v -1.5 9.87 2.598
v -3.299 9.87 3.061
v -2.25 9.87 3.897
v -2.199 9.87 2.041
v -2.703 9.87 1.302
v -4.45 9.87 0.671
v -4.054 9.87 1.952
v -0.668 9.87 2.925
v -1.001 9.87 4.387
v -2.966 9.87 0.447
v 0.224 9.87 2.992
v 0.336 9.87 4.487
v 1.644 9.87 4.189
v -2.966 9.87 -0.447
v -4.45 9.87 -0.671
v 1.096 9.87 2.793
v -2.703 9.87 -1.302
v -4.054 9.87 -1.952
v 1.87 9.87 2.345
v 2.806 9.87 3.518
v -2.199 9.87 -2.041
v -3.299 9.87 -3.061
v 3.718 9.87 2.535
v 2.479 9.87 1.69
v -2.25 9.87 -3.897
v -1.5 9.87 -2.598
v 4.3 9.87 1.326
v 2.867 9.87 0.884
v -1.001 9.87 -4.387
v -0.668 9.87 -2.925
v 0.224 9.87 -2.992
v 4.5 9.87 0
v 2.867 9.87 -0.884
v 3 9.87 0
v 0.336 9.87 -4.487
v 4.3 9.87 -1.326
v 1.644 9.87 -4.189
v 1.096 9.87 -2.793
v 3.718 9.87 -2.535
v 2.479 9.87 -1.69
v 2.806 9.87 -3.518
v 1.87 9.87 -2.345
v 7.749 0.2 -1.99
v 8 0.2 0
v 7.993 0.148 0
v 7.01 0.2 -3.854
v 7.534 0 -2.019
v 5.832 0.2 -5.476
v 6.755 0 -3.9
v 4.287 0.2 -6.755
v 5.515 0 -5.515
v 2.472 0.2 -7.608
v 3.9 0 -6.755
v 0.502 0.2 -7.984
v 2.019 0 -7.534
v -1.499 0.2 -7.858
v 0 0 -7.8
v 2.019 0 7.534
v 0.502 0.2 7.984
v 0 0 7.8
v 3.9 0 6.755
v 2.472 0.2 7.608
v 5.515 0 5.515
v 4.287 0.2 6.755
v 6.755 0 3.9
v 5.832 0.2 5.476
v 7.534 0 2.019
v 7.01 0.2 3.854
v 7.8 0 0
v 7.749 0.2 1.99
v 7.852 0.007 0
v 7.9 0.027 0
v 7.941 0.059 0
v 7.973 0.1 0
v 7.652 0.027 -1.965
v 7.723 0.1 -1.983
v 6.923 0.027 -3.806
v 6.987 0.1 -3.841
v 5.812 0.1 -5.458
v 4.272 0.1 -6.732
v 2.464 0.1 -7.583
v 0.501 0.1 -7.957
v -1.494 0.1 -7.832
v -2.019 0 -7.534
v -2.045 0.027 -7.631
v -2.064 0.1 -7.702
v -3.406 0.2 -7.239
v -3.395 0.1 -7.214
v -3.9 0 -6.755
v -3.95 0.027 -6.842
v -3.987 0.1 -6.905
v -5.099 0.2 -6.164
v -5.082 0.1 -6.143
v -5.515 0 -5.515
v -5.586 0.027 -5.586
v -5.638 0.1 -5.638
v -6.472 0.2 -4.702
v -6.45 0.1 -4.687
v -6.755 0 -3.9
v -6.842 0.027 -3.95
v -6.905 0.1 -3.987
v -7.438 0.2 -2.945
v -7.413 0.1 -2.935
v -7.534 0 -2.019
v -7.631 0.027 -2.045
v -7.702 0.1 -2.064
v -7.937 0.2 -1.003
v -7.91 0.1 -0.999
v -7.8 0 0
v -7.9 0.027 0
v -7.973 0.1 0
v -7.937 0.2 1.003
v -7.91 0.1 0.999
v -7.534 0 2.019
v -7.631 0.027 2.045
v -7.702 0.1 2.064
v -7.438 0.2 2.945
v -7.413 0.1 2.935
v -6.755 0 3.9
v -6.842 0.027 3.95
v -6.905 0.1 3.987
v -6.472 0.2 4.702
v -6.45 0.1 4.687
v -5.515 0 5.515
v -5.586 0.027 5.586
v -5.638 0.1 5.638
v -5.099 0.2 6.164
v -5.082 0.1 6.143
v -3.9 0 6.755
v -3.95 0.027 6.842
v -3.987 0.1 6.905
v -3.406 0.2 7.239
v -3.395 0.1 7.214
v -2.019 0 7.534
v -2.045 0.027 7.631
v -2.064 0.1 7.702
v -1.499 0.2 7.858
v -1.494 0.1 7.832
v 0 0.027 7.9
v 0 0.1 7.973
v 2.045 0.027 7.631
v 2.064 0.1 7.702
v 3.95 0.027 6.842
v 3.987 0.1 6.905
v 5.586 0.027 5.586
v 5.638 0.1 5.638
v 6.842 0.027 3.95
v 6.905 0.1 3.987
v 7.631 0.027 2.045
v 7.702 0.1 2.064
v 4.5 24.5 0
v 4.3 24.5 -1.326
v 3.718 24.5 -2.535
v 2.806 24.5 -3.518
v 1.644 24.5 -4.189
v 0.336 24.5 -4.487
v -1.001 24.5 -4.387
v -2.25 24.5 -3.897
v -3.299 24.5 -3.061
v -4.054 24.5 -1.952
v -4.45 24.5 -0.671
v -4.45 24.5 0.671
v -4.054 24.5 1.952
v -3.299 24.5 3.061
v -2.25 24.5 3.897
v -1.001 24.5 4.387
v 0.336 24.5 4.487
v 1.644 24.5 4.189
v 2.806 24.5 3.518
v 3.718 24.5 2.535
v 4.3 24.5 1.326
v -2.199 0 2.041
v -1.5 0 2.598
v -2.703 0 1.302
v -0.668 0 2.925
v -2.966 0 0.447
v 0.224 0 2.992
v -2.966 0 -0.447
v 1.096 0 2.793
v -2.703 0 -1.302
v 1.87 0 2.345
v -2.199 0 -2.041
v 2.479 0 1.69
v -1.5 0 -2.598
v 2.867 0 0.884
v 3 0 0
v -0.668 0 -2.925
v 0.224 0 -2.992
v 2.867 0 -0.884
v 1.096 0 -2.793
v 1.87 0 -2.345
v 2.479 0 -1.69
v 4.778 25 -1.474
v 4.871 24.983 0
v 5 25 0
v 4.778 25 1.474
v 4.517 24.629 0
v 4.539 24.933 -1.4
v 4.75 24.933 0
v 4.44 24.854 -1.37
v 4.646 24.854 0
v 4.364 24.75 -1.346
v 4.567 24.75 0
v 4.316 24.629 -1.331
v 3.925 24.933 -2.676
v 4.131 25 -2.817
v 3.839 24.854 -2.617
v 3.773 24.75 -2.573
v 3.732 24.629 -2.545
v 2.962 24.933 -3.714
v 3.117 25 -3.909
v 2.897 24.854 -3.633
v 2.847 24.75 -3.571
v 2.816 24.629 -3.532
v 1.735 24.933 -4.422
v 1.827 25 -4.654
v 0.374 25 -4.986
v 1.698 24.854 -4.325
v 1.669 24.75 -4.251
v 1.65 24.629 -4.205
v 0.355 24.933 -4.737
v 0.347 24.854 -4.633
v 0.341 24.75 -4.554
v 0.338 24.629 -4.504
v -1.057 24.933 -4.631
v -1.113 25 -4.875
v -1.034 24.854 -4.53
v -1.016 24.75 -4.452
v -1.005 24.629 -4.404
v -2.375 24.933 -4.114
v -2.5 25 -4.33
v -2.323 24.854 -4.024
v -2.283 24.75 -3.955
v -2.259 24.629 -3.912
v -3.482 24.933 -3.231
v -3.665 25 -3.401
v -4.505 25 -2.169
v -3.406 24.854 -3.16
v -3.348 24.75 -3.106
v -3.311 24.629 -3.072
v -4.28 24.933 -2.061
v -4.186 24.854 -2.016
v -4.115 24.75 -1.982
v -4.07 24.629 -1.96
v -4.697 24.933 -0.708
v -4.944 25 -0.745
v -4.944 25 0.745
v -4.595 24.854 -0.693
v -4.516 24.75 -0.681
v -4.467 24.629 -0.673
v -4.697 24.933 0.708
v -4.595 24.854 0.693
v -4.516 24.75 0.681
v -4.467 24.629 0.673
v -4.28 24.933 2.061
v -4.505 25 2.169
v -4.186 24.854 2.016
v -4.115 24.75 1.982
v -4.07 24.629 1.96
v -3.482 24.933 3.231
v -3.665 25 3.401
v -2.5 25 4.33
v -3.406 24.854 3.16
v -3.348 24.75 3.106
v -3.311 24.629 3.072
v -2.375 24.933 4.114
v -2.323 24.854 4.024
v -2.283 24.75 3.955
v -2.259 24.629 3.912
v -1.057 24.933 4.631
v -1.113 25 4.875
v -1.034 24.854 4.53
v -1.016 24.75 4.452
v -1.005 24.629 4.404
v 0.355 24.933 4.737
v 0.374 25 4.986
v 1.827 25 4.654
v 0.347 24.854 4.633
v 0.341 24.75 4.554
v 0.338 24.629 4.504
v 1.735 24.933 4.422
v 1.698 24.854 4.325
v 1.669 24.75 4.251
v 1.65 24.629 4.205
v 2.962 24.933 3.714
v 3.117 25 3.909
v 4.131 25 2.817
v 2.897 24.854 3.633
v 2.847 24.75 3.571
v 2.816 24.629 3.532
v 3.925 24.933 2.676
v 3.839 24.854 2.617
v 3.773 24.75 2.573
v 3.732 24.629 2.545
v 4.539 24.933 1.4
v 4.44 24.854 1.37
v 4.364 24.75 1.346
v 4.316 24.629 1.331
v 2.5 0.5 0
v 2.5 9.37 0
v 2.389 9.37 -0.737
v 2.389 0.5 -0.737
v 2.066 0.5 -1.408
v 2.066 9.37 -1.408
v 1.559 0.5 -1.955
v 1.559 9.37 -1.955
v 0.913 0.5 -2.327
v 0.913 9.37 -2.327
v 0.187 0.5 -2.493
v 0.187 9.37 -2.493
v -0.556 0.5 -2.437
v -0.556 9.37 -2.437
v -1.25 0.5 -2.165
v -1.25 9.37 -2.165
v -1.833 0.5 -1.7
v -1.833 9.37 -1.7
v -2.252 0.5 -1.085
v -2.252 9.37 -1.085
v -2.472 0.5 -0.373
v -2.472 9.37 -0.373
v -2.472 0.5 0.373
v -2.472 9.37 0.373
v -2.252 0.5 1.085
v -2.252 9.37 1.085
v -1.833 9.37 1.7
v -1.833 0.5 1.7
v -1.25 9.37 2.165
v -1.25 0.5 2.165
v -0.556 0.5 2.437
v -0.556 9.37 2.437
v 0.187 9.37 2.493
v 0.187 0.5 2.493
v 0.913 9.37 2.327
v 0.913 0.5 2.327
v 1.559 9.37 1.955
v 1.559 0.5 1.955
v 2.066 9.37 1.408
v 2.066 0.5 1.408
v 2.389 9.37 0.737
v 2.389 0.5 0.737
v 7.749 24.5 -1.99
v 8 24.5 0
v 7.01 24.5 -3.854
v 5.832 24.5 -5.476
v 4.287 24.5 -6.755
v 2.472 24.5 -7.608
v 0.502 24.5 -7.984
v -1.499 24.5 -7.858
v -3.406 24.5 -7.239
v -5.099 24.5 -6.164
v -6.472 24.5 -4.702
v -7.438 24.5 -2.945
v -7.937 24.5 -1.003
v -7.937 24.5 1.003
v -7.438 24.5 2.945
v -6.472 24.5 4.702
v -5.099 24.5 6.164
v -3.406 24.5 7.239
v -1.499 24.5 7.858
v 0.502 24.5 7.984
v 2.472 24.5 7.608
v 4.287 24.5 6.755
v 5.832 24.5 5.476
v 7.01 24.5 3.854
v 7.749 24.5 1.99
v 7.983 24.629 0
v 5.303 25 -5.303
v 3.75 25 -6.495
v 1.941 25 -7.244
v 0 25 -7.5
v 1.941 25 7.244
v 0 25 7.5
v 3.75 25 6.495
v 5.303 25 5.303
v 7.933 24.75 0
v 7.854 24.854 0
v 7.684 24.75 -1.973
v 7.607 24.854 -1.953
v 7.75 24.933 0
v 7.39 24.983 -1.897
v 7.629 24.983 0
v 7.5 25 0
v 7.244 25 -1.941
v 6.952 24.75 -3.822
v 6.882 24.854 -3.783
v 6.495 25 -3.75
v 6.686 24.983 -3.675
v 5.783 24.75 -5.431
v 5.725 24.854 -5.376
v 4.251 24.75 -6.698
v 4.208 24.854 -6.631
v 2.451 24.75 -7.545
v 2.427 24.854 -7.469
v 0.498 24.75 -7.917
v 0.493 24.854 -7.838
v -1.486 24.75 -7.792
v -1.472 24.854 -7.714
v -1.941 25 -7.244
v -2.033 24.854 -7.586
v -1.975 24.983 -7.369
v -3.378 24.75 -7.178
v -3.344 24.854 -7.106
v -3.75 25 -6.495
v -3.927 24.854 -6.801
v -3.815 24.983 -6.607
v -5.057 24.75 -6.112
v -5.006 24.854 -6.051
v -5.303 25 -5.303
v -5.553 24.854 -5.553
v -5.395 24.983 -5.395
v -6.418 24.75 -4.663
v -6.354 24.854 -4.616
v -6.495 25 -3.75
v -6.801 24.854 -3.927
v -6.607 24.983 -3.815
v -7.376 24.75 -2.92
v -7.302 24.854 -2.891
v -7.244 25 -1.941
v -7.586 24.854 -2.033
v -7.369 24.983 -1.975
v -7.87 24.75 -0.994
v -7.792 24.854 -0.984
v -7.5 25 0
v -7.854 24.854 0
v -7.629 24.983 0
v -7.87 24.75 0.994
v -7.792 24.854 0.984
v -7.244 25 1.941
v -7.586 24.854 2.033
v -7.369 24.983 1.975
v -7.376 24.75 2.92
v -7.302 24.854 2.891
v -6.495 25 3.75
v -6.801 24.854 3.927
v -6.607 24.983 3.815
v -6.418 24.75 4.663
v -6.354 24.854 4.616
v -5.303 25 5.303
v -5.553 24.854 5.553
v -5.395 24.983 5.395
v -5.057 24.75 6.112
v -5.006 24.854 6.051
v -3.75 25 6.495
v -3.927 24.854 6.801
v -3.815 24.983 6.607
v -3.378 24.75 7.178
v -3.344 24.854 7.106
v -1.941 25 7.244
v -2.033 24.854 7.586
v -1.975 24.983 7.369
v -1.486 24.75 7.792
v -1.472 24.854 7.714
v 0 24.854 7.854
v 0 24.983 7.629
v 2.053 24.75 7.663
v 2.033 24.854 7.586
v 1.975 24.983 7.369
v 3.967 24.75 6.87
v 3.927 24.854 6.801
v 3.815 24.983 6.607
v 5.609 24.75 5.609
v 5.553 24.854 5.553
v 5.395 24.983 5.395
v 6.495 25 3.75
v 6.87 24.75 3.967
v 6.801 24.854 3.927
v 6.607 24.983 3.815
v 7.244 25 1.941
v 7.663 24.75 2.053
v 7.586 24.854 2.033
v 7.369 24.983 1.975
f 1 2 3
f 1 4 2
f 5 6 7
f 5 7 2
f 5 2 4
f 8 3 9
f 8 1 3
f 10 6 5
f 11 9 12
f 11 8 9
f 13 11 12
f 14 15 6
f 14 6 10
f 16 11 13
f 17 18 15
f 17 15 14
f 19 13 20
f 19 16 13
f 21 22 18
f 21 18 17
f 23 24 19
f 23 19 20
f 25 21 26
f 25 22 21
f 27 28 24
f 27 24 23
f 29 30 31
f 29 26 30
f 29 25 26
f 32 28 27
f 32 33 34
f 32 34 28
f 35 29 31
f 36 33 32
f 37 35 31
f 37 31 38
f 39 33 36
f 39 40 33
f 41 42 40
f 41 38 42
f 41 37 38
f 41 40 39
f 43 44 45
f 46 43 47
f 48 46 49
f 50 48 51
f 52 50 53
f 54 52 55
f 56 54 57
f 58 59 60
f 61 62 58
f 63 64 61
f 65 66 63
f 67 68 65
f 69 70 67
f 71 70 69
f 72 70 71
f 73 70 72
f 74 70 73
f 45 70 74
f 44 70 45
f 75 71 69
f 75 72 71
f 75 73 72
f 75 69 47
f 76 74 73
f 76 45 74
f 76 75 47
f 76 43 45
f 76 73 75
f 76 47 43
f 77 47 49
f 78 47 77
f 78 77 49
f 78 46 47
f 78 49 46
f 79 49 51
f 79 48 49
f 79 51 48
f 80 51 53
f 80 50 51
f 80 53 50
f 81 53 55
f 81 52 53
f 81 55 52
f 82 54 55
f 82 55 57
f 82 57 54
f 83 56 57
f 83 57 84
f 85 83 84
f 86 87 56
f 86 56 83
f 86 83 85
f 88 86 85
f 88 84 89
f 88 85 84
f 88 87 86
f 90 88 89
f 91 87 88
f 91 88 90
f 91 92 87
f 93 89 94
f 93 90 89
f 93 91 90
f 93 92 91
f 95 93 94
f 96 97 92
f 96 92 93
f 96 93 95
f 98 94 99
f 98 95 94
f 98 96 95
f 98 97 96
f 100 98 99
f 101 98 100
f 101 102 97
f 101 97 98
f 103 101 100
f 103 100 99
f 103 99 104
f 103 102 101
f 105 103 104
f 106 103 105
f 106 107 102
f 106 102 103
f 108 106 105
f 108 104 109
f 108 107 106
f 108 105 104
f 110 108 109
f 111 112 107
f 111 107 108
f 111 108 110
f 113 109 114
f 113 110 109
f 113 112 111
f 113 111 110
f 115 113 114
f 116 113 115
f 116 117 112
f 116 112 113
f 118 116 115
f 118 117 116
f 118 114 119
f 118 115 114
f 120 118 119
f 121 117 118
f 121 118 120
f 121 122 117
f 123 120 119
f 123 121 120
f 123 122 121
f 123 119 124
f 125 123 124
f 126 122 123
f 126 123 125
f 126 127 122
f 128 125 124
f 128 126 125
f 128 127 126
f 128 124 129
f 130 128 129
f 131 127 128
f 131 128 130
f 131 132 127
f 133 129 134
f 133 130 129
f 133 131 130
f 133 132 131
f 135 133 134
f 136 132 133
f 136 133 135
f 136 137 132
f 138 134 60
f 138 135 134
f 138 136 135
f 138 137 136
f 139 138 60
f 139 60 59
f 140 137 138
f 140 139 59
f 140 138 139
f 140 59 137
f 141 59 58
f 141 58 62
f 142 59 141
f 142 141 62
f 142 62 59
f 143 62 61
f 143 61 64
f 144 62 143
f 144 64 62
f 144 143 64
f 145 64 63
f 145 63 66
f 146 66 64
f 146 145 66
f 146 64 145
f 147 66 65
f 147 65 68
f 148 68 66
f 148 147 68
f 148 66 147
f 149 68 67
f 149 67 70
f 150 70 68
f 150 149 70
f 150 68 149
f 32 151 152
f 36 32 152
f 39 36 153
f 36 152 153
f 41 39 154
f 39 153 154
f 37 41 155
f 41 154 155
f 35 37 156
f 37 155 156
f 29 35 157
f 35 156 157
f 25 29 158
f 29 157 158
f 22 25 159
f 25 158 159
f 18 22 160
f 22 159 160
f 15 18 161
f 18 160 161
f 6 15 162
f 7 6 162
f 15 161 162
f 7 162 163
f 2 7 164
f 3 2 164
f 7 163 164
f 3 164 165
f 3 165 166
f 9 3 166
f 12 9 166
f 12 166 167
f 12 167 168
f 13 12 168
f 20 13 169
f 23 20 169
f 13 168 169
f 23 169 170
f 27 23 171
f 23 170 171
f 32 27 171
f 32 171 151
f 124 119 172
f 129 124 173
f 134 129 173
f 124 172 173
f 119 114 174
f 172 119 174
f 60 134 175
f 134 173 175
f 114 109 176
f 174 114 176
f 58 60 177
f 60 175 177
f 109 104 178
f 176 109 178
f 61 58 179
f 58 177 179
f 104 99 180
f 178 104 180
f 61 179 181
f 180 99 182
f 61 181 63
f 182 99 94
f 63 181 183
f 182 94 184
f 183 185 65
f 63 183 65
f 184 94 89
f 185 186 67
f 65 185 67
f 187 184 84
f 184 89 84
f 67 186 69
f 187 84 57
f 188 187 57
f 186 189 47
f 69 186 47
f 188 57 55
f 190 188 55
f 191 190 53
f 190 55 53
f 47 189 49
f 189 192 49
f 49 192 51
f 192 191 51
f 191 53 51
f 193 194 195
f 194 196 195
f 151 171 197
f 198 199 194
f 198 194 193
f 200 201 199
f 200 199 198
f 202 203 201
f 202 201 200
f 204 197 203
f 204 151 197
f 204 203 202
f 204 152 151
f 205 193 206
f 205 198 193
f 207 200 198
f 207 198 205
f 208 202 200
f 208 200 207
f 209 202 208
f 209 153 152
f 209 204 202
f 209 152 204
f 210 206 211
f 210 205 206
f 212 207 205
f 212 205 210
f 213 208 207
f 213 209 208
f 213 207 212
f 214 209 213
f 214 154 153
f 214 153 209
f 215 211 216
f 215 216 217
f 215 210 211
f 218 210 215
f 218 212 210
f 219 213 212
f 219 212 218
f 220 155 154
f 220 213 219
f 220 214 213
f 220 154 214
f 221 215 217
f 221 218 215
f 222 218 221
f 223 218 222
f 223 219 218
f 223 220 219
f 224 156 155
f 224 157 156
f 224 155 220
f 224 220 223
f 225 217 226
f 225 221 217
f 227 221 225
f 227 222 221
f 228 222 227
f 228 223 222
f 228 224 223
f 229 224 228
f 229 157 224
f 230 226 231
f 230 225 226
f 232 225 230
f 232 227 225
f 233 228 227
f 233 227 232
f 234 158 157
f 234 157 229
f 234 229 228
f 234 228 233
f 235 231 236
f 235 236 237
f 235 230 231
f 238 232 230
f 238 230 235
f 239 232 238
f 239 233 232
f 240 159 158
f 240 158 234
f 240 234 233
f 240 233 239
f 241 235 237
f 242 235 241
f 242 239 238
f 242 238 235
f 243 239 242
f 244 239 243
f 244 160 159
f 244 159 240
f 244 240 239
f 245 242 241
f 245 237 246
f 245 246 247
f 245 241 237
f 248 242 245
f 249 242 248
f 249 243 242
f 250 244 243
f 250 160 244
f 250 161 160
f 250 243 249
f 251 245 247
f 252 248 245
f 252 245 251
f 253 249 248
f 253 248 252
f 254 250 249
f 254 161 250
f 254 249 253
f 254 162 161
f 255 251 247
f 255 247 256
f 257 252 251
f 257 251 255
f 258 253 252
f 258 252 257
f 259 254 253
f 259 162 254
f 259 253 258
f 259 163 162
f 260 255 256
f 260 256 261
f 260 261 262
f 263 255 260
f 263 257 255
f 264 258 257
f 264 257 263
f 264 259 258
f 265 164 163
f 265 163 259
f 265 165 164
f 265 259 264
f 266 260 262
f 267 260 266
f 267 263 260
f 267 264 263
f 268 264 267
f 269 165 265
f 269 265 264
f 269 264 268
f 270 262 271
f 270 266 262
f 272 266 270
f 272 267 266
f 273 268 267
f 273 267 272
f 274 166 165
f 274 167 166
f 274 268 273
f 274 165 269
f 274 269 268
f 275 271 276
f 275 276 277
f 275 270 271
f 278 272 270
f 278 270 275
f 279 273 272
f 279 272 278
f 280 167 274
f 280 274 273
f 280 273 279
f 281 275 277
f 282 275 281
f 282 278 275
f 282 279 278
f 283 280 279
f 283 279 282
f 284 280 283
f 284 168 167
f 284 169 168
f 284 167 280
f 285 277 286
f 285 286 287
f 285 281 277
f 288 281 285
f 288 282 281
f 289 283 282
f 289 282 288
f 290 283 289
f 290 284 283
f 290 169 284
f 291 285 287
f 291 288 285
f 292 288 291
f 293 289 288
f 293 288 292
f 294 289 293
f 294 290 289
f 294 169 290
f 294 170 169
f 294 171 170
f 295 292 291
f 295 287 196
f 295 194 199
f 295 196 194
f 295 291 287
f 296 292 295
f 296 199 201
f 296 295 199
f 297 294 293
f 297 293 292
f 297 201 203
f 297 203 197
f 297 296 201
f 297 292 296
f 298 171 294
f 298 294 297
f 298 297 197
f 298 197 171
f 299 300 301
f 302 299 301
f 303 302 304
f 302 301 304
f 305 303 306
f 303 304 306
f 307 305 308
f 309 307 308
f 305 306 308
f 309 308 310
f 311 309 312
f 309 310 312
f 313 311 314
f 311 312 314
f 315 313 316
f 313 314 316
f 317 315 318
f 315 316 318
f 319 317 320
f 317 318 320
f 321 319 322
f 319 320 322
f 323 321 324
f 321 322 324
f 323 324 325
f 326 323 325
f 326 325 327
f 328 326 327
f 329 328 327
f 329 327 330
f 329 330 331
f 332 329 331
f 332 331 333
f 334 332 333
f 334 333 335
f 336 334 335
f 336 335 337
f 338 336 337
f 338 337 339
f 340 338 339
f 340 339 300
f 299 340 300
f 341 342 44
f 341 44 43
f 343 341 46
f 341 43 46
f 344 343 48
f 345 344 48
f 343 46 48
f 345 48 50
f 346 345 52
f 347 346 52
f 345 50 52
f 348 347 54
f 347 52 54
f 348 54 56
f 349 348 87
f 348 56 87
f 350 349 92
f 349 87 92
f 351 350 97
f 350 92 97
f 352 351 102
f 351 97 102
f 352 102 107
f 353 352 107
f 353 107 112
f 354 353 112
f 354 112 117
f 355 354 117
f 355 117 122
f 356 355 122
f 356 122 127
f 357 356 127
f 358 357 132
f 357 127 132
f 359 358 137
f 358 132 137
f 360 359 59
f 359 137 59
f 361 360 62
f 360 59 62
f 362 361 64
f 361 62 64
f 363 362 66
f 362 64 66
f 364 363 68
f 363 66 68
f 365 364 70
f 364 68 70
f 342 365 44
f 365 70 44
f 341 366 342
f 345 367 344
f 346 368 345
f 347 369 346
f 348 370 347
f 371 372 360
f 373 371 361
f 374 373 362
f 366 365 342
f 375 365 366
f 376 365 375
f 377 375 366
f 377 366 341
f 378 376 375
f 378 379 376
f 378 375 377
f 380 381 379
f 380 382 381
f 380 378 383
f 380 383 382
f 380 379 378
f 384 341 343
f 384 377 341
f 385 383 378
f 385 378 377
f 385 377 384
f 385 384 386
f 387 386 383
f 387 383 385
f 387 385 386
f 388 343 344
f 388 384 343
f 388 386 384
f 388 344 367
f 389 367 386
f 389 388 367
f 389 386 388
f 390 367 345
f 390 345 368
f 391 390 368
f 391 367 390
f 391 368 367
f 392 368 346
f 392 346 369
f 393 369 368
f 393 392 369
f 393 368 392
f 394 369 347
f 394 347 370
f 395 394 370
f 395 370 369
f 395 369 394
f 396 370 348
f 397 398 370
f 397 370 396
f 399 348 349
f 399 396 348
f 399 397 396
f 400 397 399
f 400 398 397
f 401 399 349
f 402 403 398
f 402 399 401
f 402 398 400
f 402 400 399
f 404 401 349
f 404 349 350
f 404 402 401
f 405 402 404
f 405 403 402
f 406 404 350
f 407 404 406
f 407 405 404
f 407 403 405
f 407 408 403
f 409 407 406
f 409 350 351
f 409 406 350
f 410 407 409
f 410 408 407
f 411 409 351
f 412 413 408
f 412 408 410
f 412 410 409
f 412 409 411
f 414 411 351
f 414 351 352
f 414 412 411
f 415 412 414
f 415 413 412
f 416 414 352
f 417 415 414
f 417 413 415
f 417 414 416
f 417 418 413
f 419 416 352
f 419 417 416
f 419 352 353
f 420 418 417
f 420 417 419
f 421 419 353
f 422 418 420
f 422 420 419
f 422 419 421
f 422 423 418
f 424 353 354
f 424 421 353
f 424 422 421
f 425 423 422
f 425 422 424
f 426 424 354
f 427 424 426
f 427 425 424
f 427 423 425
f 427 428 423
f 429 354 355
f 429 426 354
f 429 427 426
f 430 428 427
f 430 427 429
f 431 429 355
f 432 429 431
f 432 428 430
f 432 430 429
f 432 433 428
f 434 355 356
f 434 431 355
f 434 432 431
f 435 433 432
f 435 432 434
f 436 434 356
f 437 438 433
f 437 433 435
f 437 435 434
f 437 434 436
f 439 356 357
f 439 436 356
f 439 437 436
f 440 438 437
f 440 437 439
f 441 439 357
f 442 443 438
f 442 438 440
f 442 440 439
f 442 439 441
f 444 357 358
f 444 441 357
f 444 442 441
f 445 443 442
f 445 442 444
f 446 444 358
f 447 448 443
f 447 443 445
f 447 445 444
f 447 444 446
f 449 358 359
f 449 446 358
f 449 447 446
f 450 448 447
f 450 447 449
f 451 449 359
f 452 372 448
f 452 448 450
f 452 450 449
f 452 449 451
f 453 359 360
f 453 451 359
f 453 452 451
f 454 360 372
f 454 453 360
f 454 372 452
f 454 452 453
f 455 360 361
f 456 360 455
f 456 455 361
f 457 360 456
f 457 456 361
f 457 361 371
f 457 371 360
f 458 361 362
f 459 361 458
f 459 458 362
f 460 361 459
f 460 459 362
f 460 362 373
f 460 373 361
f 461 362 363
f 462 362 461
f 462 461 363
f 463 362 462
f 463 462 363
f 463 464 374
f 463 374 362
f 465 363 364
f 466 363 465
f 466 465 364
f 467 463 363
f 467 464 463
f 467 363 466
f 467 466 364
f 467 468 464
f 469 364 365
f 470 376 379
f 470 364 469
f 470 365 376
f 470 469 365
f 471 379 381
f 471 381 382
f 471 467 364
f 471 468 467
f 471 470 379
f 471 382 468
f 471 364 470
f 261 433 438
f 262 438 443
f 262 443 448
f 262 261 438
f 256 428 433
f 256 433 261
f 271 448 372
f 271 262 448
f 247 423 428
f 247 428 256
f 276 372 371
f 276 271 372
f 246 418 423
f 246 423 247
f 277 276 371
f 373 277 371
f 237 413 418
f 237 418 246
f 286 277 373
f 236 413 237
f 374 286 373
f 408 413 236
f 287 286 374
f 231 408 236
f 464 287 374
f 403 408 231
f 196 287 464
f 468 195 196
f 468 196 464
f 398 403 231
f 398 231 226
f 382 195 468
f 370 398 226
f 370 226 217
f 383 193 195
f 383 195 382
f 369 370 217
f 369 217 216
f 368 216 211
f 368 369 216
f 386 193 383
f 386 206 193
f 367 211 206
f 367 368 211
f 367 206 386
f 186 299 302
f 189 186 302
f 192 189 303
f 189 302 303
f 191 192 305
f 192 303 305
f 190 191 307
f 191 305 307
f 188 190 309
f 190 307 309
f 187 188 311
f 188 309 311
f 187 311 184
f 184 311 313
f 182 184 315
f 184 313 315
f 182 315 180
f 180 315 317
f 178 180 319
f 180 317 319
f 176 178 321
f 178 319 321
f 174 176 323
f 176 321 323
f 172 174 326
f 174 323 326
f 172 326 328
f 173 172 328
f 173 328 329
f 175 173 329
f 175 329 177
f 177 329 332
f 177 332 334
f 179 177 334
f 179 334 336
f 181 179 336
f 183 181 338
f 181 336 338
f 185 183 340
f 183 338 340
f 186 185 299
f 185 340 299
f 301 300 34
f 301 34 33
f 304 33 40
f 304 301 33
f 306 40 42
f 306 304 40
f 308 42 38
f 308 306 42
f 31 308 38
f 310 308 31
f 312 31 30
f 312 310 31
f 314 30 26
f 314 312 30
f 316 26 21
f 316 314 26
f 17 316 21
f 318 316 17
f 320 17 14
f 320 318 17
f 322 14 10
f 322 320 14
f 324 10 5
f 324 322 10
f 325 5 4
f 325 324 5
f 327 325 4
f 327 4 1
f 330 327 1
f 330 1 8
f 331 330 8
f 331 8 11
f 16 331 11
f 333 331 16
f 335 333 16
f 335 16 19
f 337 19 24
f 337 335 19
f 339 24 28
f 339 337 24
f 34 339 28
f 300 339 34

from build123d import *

# Parameters (mm, degrees)
SKETCH2_R           = 8
BOSS_EXTRUDE1_DEPTH = 25
SKETCH3_R           = 4.5
CUT_EXTRUDE1_DEPTH  = 15.13
SKETCH4_R           = 2.5
CUT_EXTRUDE2_DEPTH  = 10.87
FILLET1_R           = 0.5
FILLET2_R           = 0.5
CHAMFER1_SIZE       = 0.5
FILLET3_R           = 0.2


with BuildPart() as part:
    # Sketch2 → Boss-Extrude1 (new body)
    with BuildSketch(Plane(origin=(0, 0, 0), x_dir=(1, 0, 0), z_dir=(0, 1, 0))):
        Circle(SKETCH2_R)
    extrude(amount=BOSS_EXTRUDE1_DEPTH)

    # Sketch3 → Cut-Extrude1 (cut)
    with BuildSketch(Plane(origin=(0, 25, 0), x_dir=(1, 0, 0), z_dir=(0, 1, 0))):
        Circle(SKETCH3_R)
    extrude(amount=-CUT_EXTRUDE1_DEPTH, mode=Mode.SUBTRACT)

    # Sketch4 → Cut-Extrude2 (cut, through all)
    with BuildSketch(Plane(origin=(0, 9.87, 0), x_dir=(1, 0, 0), z_dir=(0, 1, 0))):
        Circle(SKETCH4_R)
    extrude(amount=-CUT_EXTRUDE2_DEPTH, mode=Mode.SUBTRACT)

    # Fillet1
    fillet1_edges = [part.edges().sort_by_distance(p)[0] for p in [
        (-8, 25, 0),
    ]]
    fillet(fillet1_edges, radius=FILLET1_R)

    # Fillet2
    fillet2_edges = [part.edges().sort_by_distance(p)[0] for p in [
        (-4.5, 25, 0),
    ]]
    fillet(fillet2_edges, radius=FILLET2_R)

    # Chamfer1
    chamfer1_edges = [part.edges().sort_by_distance(p)[0] for p in [
        (-2.5, 0, 0),
        (-2.5, 9.87, 0),
    ]]
    chamfer(chamfer1_edges, length=CHAMFER1_SIZE)

    # Fillet3
    fillet3_edges = [part.edges().sort_by_distance(p)[0] for p in [
        (-8, 0, 0),
    ]]
    fillet(fillet3_edges, radius=FILLET3_R)


solid = part.part
